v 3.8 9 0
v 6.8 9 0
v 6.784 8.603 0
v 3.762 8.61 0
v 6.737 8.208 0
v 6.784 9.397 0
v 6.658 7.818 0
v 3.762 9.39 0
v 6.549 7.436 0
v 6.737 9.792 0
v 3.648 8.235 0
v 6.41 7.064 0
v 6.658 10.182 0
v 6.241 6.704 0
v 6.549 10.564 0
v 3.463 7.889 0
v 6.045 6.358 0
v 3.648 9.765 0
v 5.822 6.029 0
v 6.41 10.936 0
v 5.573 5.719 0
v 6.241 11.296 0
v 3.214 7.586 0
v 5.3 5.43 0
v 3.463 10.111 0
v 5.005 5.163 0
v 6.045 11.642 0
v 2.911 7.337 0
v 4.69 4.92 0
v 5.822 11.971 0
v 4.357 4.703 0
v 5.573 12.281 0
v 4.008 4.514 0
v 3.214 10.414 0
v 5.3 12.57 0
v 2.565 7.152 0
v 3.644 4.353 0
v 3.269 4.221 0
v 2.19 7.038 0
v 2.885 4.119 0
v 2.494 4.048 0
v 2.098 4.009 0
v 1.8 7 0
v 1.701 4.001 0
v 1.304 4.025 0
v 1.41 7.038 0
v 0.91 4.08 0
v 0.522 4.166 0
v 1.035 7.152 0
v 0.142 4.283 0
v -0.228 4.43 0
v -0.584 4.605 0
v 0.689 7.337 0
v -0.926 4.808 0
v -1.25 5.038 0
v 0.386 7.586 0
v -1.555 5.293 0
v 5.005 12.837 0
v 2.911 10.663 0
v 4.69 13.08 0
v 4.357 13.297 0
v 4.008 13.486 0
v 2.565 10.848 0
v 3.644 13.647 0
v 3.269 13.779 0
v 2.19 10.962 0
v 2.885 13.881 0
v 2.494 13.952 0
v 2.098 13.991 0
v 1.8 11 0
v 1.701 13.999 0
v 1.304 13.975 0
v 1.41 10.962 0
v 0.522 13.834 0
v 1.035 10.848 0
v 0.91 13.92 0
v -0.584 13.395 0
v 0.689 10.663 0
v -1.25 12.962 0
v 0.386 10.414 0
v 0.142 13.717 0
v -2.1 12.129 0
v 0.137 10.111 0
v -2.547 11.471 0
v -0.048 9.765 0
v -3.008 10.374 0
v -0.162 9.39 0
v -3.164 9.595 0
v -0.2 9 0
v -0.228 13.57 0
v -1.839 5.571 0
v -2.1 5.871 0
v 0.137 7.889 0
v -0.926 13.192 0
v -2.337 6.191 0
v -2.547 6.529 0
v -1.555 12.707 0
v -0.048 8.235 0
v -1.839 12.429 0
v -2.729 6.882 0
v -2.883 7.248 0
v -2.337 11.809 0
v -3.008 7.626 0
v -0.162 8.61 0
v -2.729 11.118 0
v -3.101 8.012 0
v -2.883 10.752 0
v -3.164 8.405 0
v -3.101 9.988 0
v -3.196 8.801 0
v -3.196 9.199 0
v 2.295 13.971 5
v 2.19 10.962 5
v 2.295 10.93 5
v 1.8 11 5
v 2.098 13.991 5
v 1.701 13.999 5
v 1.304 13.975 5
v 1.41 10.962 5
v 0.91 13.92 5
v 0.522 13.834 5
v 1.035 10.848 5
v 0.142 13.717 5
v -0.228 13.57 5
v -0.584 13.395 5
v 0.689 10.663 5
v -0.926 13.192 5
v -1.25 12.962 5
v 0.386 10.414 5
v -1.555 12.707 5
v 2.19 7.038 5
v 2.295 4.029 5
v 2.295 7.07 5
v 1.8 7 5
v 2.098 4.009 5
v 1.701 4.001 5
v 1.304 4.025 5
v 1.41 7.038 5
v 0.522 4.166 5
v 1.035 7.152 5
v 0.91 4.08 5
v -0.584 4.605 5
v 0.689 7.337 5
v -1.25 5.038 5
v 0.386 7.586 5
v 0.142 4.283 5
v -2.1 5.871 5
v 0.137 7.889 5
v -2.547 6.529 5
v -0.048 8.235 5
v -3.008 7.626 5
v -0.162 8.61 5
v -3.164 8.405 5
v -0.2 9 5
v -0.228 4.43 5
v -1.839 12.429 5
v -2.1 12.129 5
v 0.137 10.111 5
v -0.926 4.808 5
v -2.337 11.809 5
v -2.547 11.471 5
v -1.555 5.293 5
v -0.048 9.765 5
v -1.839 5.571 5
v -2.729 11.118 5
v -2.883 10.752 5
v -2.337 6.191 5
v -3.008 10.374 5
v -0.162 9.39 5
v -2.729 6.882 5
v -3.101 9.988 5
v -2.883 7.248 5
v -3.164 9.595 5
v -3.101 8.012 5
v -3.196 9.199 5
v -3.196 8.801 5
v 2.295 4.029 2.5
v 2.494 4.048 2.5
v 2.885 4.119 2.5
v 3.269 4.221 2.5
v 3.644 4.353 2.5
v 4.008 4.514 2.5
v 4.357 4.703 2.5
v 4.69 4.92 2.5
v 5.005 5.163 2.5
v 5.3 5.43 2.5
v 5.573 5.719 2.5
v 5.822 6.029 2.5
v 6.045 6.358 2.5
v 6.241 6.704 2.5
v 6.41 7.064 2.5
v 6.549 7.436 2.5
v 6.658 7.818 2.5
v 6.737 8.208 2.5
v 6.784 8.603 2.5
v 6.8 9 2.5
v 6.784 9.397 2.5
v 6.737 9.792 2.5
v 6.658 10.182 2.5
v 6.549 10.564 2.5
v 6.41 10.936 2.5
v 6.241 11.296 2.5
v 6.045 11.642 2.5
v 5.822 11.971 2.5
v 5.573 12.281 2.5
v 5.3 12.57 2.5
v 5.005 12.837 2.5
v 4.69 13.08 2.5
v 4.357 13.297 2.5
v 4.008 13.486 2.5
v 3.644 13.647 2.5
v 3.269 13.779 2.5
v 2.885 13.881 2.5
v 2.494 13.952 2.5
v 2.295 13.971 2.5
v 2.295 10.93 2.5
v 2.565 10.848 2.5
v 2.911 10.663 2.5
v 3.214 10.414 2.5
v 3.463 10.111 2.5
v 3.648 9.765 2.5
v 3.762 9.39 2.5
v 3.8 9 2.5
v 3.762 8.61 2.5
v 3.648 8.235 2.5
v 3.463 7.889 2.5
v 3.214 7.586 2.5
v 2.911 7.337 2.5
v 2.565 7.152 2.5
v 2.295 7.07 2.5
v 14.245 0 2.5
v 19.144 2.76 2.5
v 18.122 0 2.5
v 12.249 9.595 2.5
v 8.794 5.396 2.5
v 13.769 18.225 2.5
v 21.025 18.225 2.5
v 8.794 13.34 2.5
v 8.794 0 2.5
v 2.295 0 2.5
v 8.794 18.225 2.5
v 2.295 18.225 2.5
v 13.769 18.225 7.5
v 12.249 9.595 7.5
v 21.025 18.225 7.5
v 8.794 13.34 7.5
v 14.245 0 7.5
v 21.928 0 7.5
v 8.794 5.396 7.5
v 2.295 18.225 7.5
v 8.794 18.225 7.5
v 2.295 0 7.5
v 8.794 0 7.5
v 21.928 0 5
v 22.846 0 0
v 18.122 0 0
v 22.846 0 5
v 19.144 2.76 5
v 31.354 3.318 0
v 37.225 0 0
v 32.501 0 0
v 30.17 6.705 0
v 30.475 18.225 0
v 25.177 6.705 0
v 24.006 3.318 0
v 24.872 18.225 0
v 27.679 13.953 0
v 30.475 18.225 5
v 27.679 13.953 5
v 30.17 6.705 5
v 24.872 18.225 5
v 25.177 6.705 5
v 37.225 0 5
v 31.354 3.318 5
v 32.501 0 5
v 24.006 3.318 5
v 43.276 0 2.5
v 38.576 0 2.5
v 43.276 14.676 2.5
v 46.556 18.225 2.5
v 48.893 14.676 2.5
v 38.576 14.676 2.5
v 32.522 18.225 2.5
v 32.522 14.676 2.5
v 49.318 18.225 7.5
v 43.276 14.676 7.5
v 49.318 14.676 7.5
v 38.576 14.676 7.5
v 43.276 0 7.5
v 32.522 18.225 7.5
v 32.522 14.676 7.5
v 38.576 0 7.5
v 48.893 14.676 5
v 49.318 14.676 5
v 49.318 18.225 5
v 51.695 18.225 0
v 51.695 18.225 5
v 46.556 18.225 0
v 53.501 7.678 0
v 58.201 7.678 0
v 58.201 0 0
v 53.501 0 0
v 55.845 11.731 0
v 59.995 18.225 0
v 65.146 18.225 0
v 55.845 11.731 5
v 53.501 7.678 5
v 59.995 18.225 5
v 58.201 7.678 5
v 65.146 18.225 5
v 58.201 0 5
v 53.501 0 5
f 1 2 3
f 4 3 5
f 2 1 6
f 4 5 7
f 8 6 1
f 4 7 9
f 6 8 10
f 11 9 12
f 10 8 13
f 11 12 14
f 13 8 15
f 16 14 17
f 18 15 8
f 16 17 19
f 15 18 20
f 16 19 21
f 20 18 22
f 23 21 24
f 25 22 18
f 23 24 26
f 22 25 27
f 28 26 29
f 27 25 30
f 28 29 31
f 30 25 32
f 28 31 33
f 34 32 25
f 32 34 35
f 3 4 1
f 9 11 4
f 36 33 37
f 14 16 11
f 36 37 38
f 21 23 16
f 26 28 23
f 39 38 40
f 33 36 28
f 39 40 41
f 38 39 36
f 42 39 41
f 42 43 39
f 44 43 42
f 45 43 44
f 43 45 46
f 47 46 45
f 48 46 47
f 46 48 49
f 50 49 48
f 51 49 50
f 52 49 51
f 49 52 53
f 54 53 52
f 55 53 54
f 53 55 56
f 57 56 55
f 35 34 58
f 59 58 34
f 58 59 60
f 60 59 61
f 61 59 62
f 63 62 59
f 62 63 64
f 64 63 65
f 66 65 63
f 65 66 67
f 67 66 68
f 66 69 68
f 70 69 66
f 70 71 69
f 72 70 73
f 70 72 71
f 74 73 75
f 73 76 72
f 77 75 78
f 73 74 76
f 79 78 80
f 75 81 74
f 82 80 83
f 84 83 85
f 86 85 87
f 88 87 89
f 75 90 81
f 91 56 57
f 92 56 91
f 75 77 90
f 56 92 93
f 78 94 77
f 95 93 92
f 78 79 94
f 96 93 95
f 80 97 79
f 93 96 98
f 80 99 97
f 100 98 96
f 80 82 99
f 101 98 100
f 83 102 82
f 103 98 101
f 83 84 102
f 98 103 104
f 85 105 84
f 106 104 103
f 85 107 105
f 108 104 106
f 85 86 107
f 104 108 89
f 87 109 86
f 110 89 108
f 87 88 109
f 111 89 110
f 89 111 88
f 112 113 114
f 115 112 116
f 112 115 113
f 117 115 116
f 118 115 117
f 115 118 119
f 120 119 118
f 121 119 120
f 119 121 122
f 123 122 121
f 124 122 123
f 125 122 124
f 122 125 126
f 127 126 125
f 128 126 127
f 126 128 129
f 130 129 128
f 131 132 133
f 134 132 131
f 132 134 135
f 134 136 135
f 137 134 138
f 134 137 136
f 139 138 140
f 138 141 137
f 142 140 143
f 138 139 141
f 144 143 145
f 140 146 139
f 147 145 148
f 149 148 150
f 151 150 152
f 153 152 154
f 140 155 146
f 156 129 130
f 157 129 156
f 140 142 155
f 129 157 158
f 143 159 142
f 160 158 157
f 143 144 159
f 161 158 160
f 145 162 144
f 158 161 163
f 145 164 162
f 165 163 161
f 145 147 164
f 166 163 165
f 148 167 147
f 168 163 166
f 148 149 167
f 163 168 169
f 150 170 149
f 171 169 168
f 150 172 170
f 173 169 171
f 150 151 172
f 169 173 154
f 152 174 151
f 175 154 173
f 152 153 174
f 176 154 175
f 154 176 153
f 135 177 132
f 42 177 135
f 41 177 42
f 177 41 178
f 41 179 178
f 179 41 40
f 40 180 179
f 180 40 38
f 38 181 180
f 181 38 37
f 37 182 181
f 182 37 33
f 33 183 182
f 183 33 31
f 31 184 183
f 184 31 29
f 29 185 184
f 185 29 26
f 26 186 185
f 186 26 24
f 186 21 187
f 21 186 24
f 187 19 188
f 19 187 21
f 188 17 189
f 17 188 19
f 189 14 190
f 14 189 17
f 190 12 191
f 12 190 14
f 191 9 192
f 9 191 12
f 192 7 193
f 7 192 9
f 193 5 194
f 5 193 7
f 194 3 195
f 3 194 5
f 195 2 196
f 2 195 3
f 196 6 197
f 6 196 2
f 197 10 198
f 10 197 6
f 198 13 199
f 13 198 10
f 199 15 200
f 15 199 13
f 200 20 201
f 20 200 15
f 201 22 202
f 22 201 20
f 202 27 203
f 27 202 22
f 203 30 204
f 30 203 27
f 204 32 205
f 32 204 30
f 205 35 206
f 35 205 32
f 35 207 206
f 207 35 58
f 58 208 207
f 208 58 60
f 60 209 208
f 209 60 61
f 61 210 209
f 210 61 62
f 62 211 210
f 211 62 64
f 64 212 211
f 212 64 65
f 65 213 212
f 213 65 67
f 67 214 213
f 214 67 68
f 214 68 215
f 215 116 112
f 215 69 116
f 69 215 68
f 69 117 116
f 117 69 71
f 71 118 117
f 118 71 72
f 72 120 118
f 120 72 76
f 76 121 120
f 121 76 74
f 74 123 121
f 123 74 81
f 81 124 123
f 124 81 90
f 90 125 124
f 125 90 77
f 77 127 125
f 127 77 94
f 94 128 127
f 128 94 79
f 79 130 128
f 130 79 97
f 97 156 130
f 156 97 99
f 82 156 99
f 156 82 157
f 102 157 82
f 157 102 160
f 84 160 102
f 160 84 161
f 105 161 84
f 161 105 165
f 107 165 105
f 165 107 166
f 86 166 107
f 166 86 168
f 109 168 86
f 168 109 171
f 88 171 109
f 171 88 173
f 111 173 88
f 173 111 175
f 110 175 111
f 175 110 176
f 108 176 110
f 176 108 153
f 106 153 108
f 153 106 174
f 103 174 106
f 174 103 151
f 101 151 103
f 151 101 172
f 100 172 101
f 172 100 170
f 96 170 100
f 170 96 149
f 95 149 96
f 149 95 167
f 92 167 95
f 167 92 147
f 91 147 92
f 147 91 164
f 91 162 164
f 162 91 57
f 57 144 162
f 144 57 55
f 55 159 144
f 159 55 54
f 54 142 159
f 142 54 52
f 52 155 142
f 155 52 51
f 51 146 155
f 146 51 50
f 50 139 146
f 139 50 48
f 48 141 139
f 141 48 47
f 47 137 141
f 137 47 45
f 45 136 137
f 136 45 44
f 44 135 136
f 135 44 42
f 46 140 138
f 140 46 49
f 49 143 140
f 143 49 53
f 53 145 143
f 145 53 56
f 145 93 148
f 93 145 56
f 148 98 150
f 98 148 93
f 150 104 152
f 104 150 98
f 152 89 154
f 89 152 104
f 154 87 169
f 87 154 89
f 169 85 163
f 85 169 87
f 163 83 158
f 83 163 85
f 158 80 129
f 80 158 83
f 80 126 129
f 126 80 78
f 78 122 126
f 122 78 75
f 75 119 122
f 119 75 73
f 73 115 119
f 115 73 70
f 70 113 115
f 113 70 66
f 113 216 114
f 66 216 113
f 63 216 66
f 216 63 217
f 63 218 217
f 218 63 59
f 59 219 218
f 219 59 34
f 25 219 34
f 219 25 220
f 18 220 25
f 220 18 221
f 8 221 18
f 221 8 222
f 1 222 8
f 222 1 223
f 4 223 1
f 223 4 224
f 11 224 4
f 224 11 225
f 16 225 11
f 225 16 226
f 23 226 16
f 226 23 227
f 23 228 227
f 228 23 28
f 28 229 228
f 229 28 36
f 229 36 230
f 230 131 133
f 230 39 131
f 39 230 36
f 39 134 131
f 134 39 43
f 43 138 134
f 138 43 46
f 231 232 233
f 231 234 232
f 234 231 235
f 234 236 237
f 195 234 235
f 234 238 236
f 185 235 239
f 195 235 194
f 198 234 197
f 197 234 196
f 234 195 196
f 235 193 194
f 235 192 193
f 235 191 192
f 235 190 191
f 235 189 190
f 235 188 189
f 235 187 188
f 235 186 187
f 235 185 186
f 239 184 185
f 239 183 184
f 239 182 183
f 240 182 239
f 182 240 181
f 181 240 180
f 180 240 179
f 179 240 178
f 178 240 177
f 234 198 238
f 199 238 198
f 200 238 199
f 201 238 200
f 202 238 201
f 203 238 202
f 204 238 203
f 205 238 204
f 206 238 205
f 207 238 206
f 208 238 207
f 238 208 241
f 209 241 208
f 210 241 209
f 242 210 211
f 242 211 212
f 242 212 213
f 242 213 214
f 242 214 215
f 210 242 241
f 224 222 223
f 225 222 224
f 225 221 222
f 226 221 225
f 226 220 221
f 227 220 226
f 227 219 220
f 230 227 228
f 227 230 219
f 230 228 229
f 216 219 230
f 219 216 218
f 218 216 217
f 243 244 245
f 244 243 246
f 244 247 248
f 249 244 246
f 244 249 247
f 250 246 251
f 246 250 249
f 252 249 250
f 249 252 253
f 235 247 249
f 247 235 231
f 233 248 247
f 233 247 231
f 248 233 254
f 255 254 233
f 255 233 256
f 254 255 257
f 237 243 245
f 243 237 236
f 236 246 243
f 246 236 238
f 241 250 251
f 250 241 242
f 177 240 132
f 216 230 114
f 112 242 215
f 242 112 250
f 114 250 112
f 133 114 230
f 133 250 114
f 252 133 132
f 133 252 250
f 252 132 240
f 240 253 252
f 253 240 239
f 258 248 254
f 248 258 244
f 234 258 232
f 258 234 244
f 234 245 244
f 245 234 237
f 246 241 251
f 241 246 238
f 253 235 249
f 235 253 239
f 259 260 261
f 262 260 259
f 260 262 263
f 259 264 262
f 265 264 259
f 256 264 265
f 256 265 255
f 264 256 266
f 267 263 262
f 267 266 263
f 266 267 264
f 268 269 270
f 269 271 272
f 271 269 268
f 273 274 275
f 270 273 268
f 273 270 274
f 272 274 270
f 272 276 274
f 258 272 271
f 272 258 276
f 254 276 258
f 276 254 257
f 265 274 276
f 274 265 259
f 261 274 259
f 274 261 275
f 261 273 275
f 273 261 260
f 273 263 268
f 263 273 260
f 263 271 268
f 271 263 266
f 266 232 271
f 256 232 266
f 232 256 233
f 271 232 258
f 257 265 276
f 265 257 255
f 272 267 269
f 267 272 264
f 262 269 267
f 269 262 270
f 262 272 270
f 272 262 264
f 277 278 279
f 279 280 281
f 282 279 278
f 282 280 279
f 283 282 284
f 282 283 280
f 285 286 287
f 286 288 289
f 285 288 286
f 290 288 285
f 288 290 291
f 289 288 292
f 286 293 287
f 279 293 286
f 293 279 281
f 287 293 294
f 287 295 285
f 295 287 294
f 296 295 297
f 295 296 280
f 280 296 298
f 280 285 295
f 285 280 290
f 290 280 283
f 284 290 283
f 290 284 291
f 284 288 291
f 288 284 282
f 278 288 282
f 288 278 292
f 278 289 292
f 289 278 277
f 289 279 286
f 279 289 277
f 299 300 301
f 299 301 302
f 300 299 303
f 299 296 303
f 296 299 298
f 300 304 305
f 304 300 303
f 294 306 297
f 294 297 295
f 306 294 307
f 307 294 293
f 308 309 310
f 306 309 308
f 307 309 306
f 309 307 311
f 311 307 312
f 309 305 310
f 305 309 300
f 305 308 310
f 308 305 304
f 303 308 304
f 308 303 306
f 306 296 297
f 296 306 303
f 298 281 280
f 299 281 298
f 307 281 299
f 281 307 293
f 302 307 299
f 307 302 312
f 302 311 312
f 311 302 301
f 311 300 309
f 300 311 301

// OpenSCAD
$fa=1;
$fs=0.4;
font = "Inknut Antiqua:weight=900";
size = 18;
height = 5;

module letter(character) {
  linear_extrude(height = height) {
    text(character, font = font, size = size);
  }
}

color("blue") {
  translate([0.1 * size, 0.5 * size, 0]) {
    linear_extrude(height = height) {
      difference() {
        circle(5);
        circle(2);
      }
    }
  }
  translate([0, 0, 0.5 * height]) {
    letter("K");
  }
  translate([0.1 * size, 0, 0.5 * height]) {
    letter("K");
  }
  translate([size, 0, 0]) {
    letter("A");
  }
  translate([1.8 * size, 0, 0.5 * height]) {
    letter("T");
  }
  translate([2.6 * size, 0, 0]) {
    letter("Y");
  }
}
